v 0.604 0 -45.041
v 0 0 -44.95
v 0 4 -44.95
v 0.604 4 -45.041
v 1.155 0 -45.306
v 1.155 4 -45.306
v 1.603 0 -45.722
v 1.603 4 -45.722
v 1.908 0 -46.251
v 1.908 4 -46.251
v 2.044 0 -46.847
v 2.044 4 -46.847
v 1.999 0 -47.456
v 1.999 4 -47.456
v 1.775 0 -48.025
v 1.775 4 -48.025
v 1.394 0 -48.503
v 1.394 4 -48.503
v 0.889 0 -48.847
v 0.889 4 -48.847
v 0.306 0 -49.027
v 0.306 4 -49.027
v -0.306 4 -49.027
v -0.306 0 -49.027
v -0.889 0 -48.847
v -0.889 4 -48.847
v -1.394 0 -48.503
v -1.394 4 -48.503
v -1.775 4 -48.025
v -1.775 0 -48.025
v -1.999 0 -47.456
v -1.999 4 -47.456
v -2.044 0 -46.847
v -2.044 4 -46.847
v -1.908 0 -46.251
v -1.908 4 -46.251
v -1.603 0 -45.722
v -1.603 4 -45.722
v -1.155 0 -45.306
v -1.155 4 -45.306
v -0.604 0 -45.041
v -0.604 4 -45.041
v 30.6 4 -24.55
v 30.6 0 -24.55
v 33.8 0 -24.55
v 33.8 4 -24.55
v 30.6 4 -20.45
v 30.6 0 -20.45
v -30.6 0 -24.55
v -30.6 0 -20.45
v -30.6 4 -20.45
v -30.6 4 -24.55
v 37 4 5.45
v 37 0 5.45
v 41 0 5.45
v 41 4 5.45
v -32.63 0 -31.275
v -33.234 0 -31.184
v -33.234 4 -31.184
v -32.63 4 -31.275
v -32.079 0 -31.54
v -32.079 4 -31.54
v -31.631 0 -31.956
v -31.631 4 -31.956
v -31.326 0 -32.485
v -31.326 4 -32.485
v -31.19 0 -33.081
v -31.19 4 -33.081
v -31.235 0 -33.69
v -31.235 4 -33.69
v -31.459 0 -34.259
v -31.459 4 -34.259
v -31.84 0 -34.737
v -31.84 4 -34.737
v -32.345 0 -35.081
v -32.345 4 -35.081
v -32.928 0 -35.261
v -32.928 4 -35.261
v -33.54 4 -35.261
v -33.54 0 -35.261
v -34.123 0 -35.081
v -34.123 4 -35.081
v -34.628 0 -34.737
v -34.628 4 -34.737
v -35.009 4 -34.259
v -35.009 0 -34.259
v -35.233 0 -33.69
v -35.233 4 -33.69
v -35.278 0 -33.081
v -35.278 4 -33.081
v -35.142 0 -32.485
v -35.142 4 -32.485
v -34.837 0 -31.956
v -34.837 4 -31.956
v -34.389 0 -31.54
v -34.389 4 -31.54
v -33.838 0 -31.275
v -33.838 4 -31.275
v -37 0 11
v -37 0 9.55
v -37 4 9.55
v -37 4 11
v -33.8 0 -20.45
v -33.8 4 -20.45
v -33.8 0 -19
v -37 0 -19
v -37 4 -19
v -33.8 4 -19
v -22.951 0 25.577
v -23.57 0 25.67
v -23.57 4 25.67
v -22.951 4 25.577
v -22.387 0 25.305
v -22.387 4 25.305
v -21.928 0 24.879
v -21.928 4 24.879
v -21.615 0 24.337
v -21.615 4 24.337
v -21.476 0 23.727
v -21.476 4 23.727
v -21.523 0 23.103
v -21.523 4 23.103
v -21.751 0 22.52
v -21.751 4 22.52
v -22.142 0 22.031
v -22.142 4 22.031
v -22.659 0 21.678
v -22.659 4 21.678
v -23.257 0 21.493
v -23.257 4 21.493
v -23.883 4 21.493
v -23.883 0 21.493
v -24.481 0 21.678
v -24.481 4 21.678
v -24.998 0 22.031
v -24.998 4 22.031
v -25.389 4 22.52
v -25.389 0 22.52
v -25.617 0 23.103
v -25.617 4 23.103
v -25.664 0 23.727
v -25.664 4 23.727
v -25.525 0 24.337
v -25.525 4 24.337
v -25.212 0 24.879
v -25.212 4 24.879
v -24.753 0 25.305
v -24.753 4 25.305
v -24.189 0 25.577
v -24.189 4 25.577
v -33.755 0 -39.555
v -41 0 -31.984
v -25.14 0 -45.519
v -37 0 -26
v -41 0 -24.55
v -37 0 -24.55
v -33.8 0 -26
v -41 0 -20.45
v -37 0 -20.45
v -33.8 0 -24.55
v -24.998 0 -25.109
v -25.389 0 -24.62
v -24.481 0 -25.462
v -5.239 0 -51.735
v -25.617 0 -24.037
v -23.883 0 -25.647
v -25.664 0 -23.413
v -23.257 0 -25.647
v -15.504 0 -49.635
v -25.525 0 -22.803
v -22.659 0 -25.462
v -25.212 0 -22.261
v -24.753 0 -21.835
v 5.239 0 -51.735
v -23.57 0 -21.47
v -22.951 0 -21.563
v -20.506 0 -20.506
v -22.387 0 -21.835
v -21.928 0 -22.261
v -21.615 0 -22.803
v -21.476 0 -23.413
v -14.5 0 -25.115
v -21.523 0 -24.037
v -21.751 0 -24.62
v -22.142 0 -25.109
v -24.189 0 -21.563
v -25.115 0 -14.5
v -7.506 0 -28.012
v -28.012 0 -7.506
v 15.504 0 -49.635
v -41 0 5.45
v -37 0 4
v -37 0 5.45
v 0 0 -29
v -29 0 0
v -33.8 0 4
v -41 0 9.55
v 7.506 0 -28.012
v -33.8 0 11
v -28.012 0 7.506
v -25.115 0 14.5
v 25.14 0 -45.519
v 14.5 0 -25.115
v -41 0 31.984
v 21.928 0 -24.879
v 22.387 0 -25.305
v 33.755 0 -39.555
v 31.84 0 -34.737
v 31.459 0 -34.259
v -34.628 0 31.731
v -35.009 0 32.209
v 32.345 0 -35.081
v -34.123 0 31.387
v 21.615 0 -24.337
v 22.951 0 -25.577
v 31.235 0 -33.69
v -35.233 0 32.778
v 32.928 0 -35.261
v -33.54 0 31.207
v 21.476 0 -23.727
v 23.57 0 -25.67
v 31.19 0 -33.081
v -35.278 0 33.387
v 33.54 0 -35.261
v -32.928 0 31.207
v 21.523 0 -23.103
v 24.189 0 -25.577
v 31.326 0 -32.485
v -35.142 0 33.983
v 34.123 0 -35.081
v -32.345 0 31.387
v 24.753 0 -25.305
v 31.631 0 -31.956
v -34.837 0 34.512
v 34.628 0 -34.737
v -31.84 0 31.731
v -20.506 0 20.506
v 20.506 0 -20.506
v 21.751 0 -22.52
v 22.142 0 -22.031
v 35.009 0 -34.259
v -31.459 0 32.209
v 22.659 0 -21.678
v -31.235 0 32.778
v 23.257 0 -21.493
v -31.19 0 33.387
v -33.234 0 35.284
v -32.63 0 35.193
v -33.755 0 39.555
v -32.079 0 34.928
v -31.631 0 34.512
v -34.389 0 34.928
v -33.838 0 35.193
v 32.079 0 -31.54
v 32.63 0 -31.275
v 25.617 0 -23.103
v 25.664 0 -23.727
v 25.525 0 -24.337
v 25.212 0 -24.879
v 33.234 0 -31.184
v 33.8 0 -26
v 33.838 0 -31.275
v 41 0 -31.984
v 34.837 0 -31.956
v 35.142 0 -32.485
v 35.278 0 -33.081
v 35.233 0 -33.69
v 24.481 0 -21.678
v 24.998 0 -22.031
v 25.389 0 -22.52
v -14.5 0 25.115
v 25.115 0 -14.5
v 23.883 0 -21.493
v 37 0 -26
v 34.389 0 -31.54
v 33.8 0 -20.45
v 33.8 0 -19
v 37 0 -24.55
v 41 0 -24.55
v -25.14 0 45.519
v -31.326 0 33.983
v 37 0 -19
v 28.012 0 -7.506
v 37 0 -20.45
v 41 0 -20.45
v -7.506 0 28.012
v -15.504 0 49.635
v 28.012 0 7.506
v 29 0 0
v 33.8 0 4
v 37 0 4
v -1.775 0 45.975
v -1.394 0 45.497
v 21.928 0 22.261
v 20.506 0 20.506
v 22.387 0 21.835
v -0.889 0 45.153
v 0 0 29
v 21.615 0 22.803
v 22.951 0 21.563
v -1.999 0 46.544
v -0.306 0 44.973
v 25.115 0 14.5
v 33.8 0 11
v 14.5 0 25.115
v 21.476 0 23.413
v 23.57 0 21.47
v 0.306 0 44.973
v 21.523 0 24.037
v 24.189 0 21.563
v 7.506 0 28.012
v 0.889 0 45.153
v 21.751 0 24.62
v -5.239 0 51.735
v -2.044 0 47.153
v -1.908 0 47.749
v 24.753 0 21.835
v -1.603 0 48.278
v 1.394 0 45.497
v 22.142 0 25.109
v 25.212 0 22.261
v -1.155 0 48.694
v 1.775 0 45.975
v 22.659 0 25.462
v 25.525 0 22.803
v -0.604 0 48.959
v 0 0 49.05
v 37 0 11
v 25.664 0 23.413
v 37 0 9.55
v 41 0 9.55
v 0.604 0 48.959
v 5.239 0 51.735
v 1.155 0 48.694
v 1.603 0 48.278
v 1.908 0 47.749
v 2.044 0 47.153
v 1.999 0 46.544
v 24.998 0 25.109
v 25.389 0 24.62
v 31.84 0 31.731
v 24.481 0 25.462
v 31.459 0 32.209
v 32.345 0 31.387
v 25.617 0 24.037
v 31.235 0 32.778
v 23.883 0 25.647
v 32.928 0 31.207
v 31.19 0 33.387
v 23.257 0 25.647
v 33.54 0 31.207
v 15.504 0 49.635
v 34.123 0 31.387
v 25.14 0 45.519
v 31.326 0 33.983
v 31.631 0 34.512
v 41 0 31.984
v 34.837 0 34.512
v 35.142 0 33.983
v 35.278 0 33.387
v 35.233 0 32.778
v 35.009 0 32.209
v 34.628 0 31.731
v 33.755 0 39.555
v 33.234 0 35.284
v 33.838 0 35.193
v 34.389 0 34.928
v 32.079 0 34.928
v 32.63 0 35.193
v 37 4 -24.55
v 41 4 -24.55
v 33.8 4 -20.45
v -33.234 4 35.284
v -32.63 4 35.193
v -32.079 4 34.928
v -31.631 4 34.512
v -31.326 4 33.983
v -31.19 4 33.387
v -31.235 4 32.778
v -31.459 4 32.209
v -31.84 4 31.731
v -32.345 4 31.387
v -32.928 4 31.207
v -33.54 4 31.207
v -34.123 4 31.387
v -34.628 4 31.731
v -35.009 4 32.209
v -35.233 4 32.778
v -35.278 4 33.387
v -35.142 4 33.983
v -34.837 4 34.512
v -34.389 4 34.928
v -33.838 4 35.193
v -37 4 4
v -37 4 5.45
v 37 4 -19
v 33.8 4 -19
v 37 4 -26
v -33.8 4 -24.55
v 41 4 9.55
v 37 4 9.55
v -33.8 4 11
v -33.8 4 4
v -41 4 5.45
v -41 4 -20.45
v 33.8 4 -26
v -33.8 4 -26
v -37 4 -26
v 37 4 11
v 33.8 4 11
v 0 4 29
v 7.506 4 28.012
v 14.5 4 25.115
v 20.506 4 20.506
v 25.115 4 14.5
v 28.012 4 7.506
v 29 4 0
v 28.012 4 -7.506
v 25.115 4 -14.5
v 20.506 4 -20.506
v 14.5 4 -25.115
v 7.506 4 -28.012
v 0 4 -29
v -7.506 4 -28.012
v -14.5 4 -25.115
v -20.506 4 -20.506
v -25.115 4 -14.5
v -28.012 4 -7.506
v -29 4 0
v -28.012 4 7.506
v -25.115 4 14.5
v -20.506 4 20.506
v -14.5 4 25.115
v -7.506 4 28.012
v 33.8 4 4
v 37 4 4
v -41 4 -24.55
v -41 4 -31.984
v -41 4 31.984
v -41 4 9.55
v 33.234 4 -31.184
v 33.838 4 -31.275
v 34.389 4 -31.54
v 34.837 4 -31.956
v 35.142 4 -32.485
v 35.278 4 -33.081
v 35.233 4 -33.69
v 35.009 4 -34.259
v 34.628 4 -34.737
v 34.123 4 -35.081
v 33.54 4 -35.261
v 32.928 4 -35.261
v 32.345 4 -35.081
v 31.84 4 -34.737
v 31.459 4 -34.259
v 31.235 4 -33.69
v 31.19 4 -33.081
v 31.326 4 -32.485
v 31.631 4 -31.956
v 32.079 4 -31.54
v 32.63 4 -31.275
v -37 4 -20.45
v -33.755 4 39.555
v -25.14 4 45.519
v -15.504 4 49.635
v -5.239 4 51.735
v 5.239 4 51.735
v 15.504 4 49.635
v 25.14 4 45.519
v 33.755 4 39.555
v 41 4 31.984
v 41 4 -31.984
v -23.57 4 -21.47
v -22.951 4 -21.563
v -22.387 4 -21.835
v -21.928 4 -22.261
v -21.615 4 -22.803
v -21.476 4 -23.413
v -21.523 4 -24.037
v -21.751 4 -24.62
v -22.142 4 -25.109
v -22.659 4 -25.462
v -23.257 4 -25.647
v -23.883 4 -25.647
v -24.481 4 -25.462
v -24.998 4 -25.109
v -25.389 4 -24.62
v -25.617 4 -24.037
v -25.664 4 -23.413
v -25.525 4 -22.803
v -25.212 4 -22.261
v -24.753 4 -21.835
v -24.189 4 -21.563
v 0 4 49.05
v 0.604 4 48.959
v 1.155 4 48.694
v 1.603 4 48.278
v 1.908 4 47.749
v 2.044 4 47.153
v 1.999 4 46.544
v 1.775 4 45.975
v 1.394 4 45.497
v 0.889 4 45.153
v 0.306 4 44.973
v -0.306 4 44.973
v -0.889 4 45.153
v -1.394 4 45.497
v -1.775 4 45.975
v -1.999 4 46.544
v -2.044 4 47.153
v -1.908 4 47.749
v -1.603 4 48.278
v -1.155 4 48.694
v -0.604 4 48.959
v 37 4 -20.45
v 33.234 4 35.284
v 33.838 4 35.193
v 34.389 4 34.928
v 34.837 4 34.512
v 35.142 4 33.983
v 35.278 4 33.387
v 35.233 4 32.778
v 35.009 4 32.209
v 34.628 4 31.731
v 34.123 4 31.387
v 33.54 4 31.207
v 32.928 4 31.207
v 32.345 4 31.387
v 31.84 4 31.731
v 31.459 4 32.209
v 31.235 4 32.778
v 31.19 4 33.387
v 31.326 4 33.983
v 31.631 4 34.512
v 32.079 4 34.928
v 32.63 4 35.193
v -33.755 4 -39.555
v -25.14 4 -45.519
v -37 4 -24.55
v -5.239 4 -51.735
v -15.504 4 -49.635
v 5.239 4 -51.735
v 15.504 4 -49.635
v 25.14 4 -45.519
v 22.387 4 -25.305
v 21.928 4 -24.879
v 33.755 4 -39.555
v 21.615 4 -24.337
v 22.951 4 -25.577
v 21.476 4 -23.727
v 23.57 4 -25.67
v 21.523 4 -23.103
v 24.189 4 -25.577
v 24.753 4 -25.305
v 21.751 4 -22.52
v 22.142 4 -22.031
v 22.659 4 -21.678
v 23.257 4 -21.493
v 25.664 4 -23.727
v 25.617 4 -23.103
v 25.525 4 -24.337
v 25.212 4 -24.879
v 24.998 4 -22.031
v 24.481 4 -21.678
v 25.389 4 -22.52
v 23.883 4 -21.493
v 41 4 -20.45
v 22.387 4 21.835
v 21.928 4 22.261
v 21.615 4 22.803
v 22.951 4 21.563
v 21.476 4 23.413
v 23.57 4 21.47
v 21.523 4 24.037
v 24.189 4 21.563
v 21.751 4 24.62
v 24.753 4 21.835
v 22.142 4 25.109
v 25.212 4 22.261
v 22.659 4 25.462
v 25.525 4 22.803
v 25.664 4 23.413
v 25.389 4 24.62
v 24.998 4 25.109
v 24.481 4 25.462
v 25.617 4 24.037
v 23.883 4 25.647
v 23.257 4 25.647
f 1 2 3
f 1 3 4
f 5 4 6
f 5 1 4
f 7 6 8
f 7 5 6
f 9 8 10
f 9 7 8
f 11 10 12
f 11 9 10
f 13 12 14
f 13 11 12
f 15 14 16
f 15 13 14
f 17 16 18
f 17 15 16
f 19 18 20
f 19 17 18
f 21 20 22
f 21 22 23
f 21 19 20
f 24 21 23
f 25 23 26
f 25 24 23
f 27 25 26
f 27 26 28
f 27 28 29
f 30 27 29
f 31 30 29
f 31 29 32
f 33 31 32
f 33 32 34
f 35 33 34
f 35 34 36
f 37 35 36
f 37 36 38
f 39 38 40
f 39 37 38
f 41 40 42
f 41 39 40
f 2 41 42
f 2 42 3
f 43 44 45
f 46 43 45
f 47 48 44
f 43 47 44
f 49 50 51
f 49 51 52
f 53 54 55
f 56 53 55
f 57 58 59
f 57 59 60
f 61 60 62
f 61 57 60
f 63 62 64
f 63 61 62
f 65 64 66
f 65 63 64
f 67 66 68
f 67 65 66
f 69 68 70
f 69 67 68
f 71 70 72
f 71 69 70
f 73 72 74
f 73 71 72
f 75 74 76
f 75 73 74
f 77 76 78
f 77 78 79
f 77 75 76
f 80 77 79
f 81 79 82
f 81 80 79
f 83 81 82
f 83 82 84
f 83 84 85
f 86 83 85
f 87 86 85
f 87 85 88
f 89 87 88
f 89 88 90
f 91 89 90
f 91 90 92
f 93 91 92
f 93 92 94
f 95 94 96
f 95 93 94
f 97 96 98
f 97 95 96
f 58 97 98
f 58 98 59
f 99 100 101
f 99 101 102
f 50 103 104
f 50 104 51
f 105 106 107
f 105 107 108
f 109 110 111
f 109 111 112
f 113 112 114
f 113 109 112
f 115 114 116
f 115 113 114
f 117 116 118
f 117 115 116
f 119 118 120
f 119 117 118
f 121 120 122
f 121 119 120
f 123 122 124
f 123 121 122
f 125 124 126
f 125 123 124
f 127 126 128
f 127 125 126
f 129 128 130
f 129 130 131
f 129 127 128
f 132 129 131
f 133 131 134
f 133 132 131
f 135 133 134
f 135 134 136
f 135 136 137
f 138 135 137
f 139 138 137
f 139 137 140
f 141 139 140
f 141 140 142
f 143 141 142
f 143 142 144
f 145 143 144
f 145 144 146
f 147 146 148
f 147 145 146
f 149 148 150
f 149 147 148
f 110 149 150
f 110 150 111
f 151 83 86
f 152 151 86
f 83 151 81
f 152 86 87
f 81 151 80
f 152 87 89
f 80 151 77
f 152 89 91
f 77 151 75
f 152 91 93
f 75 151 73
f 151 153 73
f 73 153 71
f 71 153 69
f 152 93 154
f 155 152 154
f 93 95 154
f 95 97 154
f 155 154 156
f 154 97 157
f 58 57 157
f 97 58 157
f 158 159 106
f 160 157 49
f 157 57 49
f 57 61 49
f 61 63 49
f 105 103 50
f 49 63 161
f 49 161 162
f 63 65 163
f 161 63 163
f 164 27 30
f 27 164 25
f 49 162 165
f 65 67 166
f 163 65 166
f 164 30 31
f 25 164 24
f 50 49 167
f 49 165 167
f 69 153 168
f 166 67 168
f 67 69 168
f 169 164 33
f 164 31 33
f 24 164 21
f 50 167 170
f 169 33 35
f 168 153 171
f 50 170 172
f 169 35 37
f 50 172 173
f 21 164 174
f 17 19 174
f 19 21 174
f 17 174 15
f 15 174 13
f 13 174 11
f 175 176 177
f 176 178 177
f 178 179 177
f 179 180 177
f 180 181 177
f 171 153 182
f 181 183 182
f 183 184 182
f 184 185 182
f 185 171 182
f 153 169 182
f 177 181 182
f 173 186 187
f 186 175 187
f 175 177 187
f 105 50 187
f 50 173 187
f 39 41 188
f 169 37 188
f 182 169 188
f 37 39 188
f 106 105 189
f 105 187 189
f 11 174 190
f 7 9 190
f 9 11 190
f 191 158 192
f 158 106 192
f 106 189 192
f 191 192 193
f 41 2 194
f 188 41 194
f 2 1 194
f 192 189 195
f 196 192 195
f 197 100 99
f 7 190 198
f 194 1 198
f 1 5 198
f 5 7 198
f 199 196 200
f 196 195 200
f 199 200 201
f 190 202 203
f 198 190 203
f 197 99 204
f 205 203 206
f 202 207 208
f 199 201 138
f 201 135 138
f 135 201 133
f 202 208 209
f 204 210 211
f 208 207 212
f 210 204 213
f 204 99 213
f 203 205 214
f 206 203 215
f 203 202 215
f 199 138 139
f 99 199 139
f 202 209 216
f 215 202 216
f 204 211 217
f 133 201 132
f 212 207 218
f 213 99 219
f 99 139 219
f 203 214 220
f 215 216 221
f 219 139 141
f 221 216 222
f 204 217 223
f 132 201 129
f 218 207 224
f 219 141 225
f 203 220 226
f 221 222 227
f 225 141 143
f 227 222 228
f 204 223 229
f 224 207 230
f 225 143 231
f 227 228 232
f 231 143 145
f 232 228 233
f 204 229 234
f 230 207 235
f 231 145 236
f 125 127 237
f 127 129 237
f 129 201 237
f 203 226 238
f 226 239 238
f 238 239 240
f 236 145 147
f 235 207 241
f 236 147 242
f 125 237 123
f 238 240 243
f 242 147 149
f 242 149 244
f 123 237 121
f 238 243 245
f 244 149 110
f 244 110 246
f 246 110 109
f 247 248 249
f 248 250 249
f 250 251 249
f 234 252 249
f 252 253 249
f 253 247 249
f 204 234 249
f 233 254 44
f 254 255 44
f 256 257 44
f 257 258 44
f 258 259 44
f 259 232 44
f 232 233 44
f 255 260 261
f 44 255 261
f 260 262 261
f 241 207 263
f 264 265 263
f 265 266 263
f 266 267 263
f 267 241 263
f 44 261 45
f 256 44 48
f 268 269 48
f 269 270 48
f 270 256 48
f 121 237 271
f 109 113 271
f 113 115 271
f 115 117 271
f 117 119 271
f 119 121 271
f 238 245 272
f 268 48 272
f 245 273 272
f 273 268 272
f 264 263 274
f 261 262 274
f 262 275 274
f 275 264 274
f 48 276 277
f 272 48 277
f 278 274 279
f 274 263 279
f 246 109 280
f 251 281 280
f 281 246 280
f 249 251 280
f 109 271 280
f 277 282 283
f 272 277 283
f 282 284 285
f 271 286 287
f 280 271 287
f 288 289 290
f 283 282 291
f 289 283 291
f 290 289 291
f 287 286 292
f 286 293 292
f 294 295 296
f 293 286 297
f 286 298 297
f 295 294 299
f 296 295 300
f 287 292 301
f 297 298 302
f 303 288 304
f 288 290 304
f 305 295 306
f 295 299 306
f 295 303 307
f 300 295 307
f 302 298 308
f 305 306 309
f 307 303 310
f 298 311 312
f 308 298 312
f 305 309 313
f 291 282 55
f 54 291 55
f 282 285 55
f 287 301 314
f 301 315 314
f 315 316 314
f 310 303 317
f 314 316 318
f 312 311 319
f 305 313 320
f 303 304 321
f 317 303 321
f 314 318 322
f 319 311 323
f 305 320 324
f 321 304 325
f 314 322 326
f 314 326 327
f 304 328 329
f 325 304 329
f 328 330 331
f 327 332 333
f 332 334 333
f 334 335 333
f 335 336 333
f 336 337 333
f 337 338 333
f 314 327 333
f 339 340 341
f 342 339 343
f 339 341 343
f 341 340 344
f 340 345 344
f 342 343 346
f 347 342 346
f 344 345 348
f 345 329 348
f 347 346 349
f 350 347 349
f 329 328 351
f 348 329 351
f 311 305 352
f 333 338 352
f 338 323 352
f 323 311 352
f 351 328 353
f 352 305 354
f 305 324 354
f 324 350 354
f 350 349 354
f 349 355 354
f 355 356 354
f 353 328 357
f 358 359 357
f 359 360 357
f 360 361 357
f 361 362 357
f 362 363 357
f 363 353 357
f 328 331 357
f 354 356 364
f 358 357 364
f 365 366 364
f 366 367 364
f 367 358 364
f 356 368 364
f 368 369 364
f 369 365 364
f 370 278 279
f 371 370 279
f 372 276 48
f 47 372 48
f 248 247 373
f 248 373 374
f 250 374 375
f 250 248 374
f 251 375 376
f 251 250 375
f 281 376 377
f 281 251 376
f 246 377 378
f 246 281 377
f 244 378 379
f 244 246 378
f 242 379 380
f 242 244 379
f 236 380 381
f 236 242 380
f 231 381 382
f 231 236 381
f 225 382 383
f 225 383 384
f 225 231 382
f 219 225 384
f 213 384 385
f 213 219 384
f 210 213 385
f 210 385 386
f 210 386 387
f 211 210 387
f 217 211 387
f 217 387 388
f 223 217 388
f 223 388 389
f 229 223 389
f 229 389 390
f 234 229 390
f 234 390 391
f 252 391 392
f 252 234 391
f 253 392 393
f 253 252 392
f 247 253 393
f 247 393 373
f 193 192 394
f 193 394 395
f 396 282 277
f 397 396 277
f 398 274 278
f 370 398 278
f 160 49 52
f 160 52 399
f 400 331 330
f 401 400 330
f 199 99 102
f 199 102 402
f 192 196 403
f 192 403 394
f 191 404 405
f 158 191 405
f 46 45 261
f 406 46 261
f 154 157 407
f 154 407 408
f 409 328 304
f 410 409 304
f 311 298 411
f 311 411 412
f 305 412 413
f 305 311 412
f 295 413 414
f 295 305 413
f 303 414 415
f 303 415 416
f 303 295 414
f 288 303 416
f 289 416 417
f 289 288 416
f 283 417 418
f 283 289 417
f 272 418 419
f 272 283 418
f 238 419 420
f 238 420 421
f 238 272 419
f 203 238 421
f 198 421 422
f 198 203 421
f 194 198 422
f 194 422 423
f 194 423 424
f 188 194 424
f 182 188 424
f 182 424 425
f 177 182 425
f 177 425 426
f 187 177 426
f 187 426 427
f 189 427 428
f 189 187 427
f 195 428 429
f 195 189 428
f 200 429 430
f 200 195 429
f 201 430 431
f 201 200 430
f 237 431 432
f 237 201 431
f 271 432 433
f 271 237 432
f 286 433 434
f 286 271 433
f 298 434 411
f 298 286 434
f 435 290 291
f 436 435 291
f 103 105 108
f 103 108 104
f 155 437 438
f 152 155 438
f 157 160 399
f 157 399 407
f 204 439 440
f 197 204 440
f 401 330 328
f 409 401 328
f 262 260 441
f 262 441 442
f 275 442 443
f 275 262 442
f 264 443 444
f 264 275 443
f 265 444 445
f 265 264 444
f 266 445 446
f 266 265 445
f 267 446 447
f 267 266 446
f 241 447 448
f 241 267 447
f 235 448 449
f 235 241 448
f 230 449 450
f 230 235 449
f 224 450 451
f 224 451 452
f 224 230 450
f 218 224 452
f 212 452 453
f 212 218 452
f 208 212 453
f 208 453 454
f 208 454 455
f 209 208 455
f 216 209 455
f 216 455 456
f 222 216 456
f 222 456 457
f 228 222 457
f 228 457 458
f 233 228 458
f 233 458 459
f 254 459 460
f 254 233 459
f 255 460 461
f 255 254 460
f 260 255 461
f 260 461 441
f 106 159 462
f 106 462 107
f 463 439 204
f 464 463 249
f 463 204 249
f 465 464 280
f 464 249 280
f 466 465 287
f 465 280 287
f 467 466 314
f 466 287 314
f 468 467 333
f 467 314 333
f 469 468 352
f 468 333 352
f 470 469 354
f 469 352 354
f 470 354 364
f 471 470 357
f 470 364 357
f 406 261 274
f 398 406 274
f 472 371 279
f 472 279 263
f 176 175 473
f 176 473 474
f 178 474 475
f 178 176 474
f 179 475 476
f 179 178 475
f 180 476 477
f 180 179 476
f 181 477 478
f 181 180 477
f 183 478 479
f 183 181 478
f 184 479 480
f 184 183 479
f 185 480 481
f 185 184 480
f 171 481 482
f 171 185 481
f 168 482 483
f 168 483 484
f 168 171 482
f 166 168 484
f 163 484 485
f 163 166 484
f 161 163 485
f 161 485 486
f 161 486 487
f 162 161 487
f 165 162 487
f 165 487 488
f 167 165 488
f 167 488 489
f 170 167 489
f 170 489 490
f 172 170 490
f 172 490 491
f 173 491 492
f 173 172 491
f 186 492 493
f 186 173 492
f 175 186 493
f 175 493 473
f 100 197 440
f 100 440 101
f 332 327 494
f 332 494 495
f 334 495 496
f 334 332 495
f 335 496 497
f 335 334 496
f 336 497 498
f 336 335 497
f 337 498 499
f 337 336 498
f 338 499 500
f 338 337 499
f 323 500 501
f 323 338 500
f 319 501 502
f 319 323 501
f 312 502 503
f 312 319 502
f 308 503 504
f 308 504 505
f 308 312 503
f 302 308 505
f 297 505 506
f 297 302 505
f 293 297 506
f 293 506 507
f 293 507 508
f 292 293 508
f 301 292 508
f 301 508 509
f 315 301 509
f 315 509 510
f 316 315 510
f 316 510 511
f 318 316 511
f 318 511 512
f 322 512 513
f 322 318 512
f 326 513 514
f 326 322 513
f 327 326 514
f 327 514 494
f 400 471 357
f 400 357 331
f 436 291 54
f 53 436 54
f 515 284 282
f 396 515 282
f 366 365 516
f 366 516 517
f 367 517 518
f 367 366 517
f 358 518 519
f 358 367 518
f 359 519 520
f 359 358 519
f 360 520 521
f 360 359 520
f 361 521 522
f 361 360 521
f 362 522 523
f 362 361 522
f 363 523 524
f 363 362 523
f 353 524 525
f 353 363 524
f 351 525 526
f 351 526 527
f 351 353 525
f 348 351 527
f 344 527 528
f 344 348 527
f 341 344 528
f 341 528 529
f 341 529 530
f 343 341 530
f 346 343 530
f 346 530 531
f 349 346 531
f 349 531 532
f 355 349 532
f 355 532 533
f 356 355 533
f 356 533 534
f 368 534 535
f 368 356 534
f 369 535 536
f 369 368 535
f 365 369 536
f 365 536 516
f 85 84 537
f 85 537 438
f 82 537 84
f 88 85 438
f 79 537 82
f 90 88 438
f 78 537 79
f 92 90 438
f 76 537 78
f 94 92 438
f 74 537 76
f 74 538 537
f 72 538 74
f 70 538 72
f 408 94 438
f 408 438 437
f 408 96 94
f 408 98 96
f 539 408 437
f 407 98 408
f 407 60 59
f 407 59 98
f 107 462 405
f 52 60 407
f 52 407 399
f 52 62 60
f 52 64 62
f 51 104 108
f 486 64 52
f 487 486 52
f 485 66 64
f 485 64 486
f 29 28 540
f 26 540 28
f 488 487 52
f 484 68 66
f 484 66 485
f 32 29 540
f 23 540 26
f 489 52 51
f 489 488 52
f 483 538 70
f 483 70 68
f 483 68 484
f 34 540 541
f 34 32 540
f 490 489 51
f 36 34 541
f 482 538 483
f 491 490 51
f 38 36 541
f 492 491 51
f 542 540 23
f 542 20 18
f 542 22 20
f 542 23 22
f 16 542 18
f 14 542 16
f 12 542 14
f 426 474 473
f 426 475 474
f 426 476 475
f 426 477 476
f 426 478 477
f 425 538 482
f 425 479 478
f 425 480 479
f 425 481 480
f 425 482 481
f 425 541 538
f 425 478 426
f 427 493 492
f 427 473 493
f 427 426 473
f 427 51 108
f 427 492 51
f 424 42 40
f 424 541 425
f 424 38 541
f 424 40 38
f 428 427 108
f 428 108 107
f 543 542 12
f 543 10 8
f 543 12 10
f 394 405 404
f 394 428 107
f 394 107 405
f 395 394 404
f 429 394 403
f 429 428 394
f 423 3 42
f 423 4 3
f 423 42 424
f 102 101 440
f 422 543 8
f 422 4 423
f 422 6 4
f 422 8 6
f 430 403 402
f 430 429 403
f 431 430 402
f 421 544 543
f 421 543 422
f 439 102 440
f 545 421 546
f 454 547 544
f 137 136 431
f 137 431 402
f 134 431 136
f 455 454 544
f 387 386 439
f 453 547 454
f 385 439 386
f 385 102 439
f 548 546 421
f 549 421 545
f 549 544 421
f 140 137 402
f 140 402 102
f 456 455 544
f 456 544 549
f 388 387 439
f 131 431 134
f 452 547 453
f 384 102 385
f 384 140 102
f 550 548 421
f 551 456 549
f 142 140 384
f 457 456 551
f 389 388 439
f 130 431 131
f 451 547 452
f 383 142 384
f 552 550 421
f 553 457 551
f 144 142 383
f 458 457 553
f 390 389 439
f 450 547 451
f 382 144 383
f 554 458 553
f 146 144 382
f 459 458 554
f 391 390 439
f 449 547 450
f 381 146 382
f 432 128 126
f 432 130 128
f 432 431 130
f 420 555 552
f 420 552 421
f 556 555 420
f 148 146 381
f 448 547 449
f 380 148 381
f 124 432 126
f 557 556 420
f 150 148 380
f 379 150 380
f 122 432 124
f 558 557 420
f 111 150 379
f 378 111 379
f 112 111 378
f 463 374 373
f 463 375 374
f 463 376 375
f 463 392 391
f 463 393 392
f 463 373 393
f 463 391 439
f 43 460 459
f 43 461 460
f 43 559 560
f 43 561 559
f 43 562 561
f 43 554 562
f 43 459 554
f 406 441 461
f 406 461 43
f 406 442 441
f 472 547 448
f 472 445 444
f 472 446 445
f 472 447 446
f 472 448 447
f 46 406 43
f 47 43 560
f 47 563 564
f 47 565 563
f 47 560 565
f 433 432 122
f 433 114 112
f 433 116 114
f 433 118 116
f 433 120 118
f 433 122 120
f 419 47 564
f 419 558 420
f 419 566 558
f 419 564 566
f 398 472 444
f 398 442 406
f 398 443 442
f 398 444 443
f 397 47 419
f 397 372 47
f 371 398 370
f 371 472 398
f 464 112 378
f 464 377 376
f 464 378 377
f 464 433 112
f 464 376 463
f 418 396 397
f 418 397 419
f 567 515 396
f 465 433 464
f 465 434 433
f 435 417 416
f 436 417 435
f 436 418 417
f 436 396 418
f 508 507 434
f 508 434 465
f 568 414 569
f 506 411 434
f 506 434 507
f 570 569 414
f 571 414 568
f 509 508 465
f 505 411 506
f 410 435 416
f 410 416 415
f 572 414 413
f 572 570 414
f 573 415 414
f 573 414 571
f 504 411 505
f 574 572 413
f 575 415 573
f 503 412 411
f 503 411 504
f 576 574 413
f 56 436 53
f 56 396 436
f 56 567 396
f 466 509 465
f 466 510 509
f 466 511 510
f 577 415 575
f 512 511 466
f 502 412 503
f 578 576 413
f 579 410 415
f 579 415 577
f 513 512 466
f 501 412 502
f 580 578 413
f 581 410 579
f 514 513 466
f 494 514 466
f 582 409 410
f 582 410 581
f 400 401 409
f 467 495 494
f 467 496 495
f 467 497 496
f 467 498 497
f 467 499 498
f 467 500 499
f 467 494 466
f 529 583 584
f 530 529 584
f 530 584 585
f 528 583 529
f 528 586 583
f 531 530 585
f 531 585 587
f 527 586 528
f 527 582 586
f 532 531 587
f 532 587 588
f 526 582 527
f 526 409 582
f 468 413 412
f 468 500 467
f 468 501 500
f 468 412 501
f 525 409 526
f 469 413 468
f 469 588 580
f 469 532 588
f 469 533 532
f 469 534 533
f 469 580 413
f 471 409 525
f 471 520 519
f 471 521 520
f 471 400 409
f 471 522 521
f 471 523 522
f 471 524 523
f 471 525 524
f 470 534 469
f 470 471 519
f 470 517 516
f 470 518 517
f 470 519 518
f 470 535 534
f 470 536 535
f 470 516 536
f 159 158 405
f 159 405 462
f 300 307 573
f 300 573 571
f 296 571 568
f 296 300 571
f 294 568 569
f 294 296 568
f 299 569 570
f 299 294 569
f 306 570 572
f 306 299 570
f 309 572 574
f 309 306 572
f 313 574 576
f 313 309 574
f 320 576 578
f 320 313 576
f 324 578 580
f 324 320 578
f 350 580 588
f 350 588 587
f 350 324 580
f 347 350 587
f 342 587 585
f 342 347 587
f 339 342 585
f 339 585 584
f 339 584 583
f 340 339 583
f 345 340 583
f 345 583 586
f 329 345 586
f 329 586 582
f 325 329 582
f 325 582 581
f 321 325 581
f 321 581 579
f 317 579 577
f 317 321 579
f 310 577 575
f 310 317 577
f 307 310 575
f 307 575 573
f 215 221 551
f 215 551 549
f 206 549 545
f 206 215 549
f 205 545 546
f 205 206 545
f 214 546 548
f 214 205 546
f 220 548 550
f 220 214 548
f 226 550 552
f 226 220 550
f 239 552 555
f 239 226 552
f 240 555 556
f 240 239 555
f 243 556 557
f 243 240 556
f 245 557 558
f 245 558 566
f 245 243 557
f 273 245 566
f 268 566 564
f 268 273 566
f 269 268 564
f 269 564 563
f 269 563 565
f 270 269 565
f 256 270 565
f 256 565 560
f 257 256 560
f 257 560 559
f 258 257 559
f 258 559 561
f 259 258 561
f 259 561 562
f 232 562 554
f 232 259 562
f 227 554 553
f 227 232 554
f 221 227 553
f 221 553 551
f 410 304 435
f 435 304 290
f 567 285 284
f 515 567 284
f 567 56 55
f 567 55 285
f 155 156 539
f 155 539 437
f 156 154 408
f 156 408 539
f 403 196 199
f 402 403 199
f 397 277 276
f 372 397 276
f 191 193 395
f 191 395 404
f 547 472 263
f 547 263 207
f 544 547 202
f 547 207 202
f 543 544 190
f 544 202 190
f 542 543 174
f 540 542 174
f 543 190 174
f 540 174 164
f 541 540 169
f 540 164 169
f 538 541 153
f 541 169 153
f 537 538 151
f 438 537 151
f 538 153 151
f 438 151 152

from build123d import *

# Parameters (mm, degrees)
SKETCH_1_R          = 52
SKETCH_1_R_2        = 29
SKETCH_1_R_3        = 2.05
SKETCH_1_R_4        = 2.1
EXTRUDE_1_DEPTH     = 4
SKETCH_2_W          = 182
SKETCH_2_H          = 210.035227354
SKETCH_2_W_2        = 82
SKETCH_2_H_2        = 110.035227354
CUT_EXTRUDE_1_DEPTH = 4


with BuildPart() as part:
    # 草图1 → 凸台-拉伸1 (new body)
    with BuildSketch(Plane(origin=(0, 0, 0), x_dir=(1, 0, 0), z_dir=(0, 1, 0))):
        with Locations(Location((0, 0, 0), (0, 0, 270))):
            Circle(SKETCH_1_R)
        with Locations(Location((0, 0, 0), (0, 0, 270))):
            Circle(SKETCH_1_R_2, mode=Mode.SUBTRACT)
        with Locations(Location((47, 0, 0), (0, 0, 270))):
            Circle(SKETCH_1_R_3, mode=Mode.SUBTRACT)
        with Locations(Location((33.234018716, -33.234018716, 0), (0, 0, 270))):
            Circle(SKETCH_1_R_3, mode=Mode.SUBTRACT)
        with Locations(Location((0, -47, 0), (0, 0, 270))):
            Circle(SKETCH_1_R_3, mode=Mode.SUBTRACT)
        with Locations(Location((-33.234018716, -33.234018716, 0), (0, 0, 270))):
            Circle(SKETCH_1_R_3, mode=Mode.SUBTRACT)
        with Locations(Location((-47, 0, 0), (0, 0, 270))):
            Circle(SKETCH_1_R_3, mode=Mode.SUBTRACT)
        with Locations(Location((-33.234018716, 33.234018716, 0), (0, 0, 270))):
            Circle(SKETCH_1_R_3, mode=Mode.SUBTRACT)
        with Locations(Location((0, 47, 0), (0, 0, 270))):
            Circle(SKETCH_1_R_3, mode=Mode.SUBTRACT)
        with Locations(Location((33.234018716, 33.234018716, 0), (0, 0, 270))):
            Circle(SKETCH_1_R_3, mode=Mode.SUBTRACT)
        with Locations(Location((-23.57, 23.57, 0), (0, 0, 270))):
            Circle(SKETCH_1_R_4, mode=Mode.SUBTRACT)
        with Locations(Location((-23.57, -23.57, 0), (0, 0, 270))):
            Circle(SKETCH_1_R_4, mode=Mode.SUBTRACT)
        with Locations(Location((23.57, -23.57, 0), (0, 0, 90))):
            Circle(SKETCH_1_R_4, mode=Mode.SUBTRACT)
        with Locations(Location((23.57, 23.57, 0), (0, 0, 90))):
            Circle(SKETCH_1_R_4, mode=Mode.SUBTRACT)
        Polygon((37, -9.55), (37, -11), (33.8, -11), (33.8, -9.55), (33.8, -5.45), (33.8, -4), (37, -4), (37, -5.45), (41, -5.45), (41, -9.55), align=None, mode=Mode.SUBTRACT)
        Polygon((37, 20.45), (37, 19), (33.8, 19), (33.8, 20.45), (30.6, 20.45), (30.6, 24.55), (33.8, 24.55), (33.8, 26), (37, 26), (37, 24.55), (41, 24.55), (41, 20.45), align=None, mode=Mode.SUBTRACT)
        Polygon((-33.8, 26), (-37, 26), (-37, 24.55), (-41, 24.55), (-41, 20.45), (-37, 20.45), (-37, 19), (-33.8, 19), (-33.8, 20.45), (-30.6, 20.45), (-30.6, 24.55), (-33.8, 24.55), align=None, mode=Mode.SUBTRACT)
        Polygon((-33.8, -4), (-37, -4), (-37, -5.45), (-41, -5.45), (-41, -9.55), (-37, -9.55), (-37, -11), (-33.8, -11), (-33.8, -9.55), (-33.8, -5.45), align=None, mode=Mode.SUBTRACT)
    extrude(amount=EXTRUDE_1_DEPTH)

    # 草图2 → 切除-拉伸-薄壁1 (cut)
    with BuildSketch(Plane(origin=(0, 4, 0), x_dir=(1, 0, 0), z_dir=(0, 1, 0))):
        Rectangle(SKETCH_2_W, SKETCH_2_H)
        Rectangle(SKETCH_2_W_2, SKETCH_2_H_2, mode=Mode.SUBTRACT)
    extrude(amount=-CUT_EXTRUDE_1_DEPTH, mode=Mode.SUBTRACT)


solid = part.part
